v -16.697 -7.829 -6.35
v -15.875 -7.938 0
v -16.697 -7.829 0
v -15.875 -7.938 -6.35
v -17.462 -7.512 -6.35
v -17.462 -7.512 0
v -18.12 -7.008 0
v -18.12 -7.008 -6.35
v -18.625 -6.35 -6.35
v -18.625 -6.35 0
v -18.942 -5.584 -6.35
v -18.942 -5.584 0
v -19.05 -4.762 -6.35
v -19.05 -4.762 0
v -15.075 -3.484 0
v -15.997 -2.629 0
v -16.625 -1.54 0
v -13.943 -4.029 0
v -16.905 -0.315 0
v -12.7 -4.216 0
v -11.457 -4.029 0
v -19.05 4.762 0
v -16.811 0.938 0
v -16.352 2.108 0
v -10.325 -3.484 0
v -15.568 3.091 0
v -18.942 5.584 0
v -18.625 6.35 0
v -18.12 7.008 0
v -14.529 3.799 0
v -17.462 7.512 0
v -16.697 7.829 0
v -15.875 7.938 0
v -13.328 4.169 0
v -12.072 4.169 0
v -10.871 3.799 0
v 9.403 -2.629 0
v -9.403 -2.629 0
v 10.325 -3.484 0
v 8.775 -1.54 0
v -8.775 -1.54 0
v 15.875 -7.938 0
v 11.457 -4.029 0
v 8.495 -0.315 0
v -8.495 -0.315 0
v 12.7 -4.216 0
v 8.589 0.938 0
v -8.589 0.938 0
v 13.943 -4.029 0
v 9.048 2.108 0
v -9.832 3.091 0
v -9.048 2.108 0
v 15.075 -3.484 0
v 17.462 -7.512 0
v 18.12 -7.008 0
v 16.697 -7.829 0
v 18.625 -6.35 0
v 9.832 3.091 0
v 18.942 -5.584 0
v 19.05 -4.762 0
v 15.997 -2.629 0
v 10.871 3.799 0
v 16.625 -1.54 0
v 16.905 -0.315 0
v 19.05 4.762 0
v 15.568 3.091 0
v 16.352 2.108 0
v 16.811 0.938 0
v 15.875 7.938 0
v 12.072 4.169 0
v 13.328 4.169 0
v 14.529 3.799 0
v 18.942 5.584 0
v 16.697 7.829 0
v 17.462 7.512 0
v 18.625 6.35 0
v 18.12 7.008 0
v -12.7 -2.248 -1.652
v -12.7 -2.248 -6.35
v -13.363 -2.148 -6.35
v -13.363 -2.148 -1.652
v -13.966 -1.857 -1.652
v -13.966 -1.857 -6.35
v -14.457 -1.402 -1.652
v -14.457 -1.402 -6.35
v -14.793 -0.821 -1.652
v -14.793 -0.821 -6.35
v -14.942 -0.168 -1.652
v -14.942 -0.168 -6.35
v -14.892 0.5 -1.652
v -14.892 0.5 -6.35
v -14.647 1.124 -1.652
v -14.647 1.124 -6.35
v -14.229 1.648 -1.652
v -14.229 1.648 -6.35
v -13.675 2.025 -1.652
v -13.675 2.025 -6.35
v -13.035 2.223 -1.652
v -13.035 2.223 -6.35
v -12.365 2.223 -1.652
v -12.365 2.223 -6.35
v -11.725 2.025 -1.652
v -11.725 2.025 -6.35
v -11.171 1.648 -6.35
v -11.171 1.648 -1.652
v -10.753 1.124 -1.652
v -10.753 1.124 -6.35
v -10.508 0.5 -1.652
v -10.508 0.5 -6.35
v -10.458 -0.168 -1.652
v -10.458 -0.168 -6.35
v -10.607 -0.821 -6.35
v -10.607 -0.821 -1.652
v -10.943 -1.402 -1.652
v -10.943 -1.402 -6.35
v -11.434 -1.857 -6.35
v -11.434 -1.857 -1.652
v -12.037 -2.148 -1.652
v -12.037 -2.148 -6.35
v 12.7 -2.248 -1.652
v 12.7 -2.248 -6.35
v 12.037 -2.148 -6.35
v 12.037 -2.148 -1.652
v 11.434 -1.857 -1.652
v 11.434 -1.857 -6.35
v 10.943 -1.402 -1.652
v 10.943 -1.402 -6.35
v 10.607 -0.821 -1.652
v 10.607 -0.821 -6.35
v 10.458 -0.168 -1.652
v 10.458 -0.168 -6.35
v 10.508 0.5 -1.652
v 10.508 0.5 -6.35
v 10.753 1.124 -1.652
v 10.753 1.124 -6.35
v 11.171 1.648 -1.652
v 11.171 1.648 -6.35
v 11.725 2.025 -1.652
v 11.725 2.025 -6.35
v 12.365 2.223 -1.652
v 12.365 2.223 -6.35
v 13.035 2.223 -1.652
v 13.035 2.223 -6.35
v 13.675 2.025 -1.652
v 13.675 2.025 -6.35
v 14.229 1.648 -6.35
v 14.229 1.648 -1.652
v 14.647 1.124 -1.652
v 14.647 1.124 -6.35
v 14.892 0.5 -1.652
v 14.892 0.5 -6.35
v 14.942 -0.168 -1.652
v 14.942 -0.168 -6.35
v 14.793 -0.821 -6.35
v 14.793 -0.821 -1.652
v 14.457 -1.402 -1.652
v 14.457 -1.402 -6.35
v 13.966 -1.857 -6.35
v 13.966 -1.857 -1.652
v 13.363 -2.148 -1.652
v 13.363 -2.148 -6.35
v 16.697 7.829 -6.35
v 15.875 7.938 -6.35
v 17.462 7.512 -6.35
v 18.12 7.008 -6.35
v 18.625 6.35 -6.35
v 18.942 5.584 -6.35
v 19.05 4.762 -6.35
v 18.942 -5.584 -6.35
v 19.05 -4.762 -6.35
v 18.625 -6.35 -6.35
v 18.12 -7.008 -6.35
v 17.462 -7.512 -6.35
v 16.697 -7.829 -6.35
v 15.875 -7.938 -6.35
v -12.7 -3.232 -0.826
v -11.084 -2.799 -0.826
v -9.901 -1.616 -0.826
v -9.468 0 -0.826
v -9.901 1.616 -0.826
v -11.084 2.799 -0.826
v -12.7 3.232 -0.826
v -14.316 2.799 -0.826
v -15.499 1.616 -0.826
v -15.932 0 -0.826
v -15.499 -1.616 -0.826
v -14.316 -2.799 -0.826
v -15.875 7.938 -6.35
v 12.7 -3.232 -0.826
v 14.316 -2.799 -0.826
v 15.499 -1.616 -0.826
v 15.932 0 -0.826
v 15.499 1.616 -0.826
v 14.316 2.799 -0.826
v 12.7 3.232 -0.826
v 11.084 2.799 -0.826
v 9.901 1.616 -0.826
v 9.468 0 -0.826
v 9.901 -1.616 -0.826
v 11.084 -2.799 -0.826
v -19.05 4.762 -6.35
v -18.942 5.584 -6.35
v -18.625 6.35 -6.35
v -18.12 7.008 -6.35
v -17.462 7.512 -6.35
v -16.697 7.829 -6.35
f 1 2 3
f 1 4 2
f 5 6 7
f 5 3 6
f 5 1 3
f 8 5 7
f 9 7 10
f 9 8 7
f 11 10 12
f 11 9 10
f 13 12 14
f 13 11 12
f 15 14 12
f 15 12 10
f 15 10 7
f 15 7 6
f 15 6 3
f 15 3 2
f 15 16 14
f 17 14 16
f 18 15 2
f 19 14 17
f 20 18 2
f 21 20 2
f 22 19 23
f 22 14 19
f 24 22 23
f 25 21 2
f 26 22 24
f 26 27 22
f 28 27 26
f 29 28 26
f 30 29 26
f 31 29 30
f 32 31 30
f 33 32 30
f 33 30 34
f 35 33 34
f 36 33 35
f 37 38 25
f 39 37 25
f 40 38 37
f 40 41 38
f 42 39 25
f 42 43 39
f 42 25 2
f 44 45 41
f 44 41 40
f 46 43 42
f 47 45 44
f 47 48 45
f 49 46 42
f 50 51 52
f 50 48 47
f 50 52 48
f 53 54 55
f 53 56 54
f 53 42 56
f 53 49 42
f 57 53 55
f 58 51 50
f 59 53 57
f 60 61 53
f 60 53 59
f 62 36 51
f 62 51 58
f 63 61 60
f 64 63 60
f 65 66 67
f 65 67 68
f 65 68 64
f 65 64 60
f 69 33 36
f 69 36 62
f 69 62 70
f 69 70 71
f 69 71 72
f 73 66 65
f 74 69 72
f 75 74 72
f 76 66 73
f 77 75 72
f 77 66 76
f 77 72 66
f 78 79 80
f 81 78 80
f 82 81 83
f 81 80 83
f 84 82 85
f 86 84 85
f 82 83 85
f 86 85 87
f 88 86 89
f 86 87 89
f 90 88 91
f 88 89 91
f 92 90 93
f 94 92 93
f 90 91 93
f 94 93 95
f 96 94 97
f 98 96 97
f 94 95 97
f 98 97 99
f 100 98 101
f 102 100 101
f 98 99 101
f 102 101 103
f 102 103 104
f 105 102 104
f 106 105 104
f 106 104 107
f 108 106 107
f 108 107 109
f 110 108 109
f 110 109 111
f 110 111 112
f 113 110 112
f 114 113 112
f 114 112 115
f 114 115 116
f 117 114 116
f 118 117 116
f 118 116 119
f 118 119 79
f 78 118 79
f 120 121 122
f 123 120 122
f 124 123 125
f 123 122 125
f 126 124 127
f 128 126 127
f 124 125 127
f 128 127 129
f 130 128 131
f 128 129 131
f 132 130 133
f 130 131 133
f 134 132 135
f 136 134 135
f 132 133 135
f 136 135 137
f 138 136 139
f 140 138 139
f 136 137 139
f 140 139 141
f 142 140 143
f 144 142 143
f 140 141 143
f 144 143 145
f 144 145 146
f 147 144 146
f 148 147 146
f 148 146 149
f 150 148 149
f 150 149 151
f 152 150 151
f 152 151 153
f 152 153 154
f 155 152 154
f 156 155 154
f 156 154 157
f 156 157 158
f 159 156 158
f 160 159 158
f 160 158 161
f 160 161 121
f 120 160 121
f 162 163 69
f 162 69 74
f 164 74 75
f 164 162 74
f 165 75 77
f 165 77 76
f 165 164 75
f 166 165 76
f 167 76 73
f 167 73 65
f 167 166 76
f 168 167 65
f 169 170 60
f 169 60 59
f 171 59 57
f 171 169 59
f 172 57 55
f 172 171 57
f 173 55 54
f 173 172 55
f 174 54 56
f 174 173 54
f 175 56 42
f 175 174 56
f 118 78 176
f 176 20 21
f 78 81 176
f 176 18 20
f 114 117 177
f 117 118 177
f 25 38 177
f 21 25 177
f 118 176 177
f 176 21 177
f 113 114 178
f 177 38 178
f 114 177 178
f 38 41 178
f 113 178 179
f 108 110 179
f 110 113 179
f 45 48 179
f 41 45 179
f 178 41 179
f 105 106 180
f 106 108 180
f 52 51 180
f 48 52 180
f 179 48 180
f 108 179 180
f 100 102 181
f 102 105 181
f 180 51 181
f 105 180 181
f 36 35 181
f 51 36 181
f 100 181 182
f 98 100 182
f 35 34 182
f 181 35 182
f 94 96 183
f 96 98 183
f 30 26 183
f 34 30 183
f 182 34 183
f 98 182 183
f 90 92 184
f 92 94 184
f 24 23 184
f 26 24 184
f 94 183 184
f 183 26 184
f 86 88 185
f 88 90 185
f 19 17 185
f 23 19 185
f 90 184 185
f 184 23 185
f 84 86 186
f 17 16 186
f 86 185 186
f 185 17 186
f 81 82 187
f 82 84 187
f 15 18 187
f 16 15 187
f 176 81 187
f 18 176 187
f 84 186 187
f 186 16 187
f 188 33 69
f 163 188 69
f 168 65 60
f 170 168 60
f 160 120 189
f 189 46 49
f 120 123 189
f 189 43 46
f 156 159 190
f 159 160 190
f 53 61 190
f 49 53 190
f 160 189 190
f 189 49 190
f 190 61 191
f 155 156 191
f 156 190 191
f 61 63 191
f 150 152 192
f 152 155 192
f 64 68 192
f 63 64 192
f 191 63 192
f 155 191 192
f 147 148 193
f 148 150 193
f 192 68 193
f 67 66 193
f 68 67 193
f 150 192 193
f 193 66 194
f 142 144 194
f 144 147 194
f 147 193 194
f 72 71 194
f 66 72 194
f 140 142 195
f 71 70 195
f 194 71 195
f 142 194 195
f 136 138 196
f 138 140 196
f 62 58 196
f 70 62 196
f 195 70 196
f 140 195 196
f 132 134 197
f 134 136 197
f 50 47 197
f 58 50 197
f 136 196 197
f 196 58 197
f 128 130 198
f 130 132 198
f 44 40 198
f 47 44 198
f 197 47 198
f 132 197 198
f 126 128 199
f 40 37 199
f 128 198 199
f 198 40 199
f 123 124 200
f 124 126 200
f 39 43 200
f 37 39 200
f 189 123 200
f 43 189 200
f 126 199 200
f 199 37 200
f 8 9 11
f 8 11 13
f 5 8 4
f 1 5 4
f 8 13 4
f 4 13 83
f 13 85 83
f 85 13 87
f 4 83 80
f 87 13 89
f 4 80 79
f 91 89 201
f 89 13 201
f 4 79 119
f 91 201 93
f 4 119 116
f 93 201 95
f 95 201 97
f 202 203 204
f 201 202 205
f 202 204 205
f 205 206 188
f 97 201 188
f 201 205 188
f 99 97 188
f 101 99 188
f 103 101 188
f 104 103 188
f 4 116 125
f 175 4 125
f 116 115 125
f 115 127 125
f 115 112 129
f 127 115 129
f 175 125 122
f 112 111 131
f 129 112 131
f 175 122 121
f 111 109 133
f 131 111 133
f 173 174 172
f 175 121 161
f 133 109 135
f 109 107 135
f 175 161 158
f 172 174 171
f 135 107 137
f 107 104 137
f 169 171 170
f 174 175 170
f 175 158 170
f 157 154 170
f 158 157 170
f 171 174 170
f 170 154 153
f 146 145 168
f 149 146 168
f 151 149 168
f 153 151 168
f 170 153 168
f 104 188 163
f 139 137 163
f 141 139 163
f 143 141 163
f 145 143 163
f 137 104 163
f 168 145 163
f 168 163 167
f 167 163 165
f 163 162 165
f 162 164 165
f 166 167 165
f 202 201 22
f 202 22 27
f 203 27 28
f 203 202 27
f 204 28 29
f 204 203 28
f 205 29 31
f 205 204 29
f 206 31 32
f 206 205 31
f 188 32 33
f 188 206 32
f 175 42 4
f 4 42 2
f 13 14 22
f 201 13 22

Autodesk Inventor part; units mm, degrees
ref_plane "YZ Plane" through (0, 0, 0) normal (1, 0, 0) x (0, 1, 0)
ref_plane "XZ Plane" through (0, 0, 0) normal (0, 1, 0) x (-1, 0, 0)
ref_plane "XY Plane" through (0, 0, 0) normal (0, 0, 1) x (1, 0, 0)
sketch "Sketch1" plane through (0, 0, 0) normal (0, 0, 1) x (1, 0, 0)
  line L0 (0, 11.1125) -> (0, -11.1125) projected
  line L1 (-26.67, 0) -> (26.67, 0) projected
  line L2 (19.05, -7.9375) -> (-19.05, -7.9375)
  line L3 (-19.05, -7.9375) -> (-19.05, 7.9375)
  line L4 (-19.05, 7.9375) -> (19.05, 7.9375)
  line L5 (19.05, 7.9375) -> (19.05, -7.9375)
  line L6 (19.05, -7.9375) -> (-19.05, 7.9375) construction
  line L7 (-19.05, -7.9375) -> (19.05, 7.9375) construction
  point P0 (0, 0)
  point P1 (-12.7, 0)
  point P2 (12.7, 0)
  dimension "d0" = 38.1
  dimension "d1" = 12.7
  dimension "d2" = 12.7
  dimension "d3" = 15.875
extrude "Extrusion1" add sketch "Sketch1" against normal blind 6.35
hole "Hole1" at (-12.7, 0, 0) at (12.7, 0, 0) direction (0, 0, -1) diameter 4.4958 end through all countersink diameter 8.4328 countersink angle 100 clearance for "Flat Head Machine Screw (100)" size "#8" standard "Ansi Unified Screw Threads"
fillet "Fillet1" radius 3.175 4 edges at (-19.05, 7.9375, -3.175) (19.05, 7.9375, -3.175) (19.05, -7.9375, -3.175) (-19.05, -7.9375, -3.175)
